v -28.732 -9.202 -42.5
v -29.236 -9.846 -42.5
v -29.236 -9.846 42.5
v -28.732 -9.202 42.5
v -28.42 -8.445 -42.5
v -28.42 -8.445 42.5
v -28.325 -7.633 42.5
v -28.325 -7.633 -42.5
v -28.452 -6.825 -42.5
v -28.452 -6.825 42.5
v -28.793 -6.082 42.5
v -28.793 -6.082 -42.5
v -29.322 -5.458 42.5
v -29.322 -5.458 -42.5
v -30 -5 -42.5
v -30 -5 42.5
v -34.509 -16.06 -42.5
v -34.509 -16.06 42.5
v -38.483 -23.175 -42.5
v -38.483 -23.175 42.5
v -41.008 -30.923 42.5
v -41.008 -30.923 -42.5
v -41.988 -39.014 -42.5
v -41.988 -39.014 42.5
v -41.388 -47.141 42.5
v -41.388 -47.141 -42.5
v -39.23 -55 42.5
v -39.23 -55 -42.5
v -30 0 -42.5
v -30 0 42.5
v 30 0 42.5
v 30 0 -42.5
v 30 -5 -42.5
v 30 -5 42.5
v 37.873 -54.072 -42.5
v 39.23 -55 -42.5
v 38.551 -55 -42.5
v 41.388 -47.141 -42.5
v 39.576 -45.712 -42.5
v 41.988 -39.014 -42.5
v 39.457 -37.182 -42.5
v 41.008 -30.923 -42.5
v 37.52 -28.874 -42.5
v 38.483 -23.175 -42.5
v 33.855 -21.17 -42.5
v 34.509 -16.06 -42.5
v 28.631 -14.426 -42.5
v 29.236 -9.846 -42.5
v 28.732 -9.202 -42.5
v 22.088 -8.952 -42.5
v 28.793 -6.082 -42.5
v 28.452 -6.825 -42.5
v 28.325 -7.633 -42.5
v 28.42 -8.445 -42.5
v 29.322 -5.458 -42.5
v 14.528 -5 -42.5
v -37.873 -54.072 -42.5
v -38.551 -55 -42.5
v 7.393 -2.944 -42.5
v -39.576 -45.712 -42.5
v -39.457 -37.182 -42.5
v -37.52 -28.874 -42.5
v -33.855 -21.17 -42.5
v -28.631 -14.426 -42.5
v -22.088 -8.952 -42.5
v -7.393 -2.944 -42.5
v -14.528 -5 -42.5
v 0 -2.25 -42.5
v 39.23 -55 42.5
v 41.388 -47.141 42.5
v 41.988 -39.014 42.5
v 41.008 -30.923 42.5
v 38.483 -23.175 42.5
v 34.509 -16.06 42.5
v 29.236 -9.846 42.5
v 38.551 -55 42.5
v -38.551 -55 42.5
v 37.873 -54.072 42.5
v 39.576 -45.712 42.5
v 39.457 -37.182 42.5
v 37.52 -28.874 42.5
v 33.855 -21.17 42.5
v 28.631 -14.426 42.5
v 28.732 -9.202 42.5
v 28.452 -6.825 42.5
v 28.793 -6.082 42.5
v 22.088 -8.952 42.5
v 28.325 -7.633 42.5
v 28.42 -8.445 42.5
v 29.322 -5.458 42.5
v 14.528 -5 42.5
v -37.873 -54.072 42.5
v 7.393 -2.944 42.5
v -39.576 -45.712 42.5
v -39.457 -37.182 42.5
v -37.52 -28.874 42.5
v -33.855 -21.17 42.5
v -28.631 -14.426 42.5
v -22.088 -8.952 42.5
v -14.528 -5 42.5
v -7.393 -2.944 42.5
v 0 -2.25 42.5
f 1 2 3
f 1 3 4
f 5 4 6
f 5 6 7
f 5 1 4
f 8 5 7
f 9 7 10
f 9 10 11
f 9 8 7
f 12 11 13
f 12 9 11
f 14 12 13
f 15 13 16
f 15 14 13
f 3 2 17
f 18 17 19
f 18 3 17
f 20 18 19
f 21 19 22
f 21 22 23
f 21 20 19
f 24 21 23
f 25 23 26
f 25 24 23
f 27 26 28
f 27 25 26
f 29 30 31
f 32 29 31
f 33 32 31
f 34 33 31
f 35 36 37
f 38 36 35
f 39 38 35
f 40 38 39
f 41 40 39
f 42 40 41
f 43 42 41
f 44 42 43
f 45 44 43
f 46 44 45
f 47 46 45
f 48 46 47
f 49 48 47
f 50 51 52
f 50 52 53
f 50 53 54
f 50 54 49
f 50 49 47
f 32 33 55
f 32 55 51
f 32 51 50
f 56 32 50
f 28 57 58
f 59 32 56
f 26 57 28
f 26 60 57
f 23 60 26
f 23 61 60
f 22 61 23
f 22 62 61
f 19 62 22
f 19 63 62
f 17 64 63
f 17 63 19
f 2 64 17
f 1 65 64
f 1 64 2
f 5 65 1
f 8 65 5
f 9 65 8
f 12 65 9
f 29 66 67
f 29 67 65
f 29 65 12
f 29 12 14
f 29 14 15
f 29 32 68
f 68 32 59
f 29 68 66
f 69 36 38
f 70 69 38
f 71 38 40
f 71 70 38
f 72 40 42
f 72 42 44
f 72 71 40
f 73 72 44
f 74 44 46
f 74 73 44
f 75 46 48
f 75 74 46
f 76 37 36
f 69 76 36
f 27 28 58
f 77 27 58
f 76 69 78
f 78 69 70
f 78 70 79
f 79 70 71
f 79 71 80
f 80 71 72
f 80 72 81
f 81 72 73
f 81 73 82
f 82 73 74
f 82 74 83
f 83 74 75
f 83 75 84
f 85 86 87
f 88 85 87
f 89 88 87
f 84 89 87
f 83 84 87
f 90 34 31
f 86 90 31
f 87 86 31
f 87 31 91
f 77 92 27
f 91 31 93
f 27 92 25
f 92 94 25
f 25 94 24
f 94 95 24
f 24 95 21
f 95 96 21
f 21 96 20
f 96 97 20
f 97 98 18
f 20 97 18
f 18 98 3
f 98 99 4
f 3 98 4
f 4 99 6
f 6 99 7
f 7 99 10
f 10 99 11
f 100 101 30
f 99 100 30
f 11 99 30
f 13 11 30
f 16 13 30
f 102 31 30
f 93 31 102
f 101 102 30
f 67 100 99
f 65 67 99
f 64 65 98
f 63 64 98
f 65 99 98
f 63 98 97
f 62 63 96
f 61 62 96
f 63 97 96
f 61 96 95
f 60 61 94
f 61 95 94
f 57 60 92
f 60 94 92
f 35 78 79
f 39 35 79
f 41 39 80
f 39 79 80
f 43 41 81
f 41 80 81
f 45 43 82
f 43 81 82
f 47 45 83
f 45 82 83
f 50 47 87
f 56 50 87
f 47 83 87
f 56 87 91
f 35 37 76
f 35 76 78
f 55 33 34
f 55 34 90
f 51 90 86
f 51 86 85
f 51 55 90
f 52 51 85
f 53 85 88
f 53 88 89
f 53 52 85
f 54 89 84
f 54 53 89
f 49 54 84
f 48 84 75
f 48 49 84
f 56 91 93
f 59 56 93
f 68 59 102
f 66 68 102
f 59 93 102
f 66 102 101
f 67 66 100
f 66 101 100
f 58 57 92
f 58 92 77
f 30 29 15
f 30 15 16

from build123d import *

# Parameters (mm, degrees)
F0_W        = 60
F0_H        = 85
F1_DEPTH    = 5
F3_DEPTH    = 85
F4_DEPTH    = 85
F5_T1_DEPTH = 85
F6_T1_DEPTH = 90.0557507085


# Not quite as in the source:
# - a fillet or chamfer that OpenCascade refuses, or shapes differently, is made with other operations: its cross-section is extruded or revolved along the edge and cut away or added


with BuildPart() as f1:
    # F0 (on Front) → F1 (new body)
    with BuildSketch(Plane.XZ):
        Rectangle(F0_W, F0_H)
    extrude(amount=F1_DEPTH)

    # F2 (on face) → F3 (join, through all)
    with BuildSketch(Plane.XY.offset(42.5)):
        with BuildLine():
            Line((-14.5279902258, -5), (-23.2163735325, -5))
            ThreePointArc((-23.2163735325, -5), (-39.9986276925, -27.1894659474), (-39.2300904919, -55))
            Line((-39.2300904919, -55), (-37.5641118623, -55))
            ThreePointArc((-37.5641118623, -55), (-36.1025868185, -25.3667283731), (-14.5279902258, -5))
        make_face()
        with BuildLine():
            Line((23.2163735325, -5), (14.5279902258, -5))
            ThreePointArc((14.5279902258, -5), (36.1025868185, -25.3667283731), (37.5641118623, -55))
            Line((37.5641118623, -55), (39.2300904919, -55))
            ThreePointArc((39.2300904919, -55), (39.9986276925, -27.1894659474), (23.2163735325, -5))
        make_face()
        with BuildLine():
            ThreePointArc((14.5279902258, -5), (0, -2.25), (-14.5279902258, -5))
            Line((-14.5279902258, -5), (14.5279902258, -5))
        make_face()
        with BuildLine():
            Line((14.5279902258, -5), (-14.5279902258, -5))
            ThreePointArc((-14.5279902258, -5), (-36.1025868185, -25.3667283731), (-37.5641118623, -55))
            Line((-37.5641118623, -55), (37.5641118623, -55))
            ThreePointArc((37.5641118623, -55), (36.1025868185, -25.3667283731), (14.5279902258, -5))
        make_face()
    extrude(amount=-F3_DEPTH)

    # F2 (on face) → F4 (cut, through all)
    with BuildSketch(Plane.XY.offset(42.5)):
        with BuildLine():
            Line((14.5279902258, -5), (-14.5279902258, -5))
            ThreePointArc((-14.5279902258, -5), (-36.1025868185, -25.3667283731), (-37.5641118623, -55))
            Line((-37.5641118623, -55), (37.5641118623, -55))
            ThreePointArc((37.5641118623, -55), (36.1025868185, -25.3667283731), (14.5279902258, -5))
        make_face()
        with BuildLine():
            ThreePointArc((14.5279902258, -5), (0, -2.25), (-14.5279902258, -5))
            Line((-14.5279902258, -5), (14.5279902258, -5))
        make_face()
    extrude(amount=-F4_DEPTH, mode=Mode.SUBTRACT)

    # F5: fillet of radius 3 on 2 edges, made by hand

    # F5_s2 → F5_t1 (join)
    with BuildSketch(Plane.XY.offset(-42.5)):
        with BuildLine():
            ThreePointArc((30, -5), (28.3606490054, -7.224664287), (29.2357538945, -9.8458842905))
            ThreePointArc((29.2357538945, -9.8458842905), (26.3377498383, -7.2842097229), (23.2163735325, -5))
            Line((23.2163735325, -5), (30, -5))
        make_face()
        with BuildLine():
            ThreePointArc((-29.2357538945, -9.8458842905), (-28.3606490054, -7.224664287), (-30, -5))
            Line((-30, -5), (-23.2163735325, -5))
            ThreePointArc((-23.2163735325, -5), (-26.3377498383, -7.2842097229), (-29.2357538945, -9.8458842905))
        make_face()
    extrude(amount=F5_T1_DEPTH)

    # F6: chamfer of 1 on 2 edges, made by hand

    # F6_s2 → F6_t1 (cut)
    with BuildSketch(Plane.XY.offset(-45.0278753542)):
        with BuildLine():
            Line((-37.8490587869, -54.0393279007), (-38.5747461473, -55.0322947503))
            Line((-38.5747461473, -55.0322947503), (-38.5747461473, -55.0522947503))
            ThreePointArc((-38.5747461473, -55.0522947503), (-38.0694290048, -55.02), (-37.5641118623, -55.02))
            Line((-37.5641118623, -55.02), (-37.5452116802, -54.9934591195))
            ThreePointArc((-37.5452116802, -54.9934591195), (-37.7059205116, -54.5194432134), (-37.8300033601, -54.0332541283))
            Line((-37.8300033601, -54.0332541283), (-37.8490587869, -54.0393279007))
        make_face()
        with BuildLine():
            Line((38.5747461473, -55.0322947503), (37.8490587869, -54.0393279007))
            Line((37.8490587869, -54.0393279007), (37.8300033601, -54.0332541283))
            ThreePointArc((37.8300033601, -54.0332541283), (37.7059205116, -54.5194432134), (37.5452116802, -54.9934591195))
            Line((37.5452116802, -54.9934591195), (37.5641118623, -55.02))
            ThreePointArc((37.5641118623, -55.02), (38.0694290048, -55.02), (38.5747461473, -55.0522947503))
            Line((38.5747461473, -55.0522947503), (38.5747461473, -55.0322947503))
        make_face()
    extrude(amount=F6_T1_DEPTH, mode=Mode.SUBTRACT)


solid = f1.part
